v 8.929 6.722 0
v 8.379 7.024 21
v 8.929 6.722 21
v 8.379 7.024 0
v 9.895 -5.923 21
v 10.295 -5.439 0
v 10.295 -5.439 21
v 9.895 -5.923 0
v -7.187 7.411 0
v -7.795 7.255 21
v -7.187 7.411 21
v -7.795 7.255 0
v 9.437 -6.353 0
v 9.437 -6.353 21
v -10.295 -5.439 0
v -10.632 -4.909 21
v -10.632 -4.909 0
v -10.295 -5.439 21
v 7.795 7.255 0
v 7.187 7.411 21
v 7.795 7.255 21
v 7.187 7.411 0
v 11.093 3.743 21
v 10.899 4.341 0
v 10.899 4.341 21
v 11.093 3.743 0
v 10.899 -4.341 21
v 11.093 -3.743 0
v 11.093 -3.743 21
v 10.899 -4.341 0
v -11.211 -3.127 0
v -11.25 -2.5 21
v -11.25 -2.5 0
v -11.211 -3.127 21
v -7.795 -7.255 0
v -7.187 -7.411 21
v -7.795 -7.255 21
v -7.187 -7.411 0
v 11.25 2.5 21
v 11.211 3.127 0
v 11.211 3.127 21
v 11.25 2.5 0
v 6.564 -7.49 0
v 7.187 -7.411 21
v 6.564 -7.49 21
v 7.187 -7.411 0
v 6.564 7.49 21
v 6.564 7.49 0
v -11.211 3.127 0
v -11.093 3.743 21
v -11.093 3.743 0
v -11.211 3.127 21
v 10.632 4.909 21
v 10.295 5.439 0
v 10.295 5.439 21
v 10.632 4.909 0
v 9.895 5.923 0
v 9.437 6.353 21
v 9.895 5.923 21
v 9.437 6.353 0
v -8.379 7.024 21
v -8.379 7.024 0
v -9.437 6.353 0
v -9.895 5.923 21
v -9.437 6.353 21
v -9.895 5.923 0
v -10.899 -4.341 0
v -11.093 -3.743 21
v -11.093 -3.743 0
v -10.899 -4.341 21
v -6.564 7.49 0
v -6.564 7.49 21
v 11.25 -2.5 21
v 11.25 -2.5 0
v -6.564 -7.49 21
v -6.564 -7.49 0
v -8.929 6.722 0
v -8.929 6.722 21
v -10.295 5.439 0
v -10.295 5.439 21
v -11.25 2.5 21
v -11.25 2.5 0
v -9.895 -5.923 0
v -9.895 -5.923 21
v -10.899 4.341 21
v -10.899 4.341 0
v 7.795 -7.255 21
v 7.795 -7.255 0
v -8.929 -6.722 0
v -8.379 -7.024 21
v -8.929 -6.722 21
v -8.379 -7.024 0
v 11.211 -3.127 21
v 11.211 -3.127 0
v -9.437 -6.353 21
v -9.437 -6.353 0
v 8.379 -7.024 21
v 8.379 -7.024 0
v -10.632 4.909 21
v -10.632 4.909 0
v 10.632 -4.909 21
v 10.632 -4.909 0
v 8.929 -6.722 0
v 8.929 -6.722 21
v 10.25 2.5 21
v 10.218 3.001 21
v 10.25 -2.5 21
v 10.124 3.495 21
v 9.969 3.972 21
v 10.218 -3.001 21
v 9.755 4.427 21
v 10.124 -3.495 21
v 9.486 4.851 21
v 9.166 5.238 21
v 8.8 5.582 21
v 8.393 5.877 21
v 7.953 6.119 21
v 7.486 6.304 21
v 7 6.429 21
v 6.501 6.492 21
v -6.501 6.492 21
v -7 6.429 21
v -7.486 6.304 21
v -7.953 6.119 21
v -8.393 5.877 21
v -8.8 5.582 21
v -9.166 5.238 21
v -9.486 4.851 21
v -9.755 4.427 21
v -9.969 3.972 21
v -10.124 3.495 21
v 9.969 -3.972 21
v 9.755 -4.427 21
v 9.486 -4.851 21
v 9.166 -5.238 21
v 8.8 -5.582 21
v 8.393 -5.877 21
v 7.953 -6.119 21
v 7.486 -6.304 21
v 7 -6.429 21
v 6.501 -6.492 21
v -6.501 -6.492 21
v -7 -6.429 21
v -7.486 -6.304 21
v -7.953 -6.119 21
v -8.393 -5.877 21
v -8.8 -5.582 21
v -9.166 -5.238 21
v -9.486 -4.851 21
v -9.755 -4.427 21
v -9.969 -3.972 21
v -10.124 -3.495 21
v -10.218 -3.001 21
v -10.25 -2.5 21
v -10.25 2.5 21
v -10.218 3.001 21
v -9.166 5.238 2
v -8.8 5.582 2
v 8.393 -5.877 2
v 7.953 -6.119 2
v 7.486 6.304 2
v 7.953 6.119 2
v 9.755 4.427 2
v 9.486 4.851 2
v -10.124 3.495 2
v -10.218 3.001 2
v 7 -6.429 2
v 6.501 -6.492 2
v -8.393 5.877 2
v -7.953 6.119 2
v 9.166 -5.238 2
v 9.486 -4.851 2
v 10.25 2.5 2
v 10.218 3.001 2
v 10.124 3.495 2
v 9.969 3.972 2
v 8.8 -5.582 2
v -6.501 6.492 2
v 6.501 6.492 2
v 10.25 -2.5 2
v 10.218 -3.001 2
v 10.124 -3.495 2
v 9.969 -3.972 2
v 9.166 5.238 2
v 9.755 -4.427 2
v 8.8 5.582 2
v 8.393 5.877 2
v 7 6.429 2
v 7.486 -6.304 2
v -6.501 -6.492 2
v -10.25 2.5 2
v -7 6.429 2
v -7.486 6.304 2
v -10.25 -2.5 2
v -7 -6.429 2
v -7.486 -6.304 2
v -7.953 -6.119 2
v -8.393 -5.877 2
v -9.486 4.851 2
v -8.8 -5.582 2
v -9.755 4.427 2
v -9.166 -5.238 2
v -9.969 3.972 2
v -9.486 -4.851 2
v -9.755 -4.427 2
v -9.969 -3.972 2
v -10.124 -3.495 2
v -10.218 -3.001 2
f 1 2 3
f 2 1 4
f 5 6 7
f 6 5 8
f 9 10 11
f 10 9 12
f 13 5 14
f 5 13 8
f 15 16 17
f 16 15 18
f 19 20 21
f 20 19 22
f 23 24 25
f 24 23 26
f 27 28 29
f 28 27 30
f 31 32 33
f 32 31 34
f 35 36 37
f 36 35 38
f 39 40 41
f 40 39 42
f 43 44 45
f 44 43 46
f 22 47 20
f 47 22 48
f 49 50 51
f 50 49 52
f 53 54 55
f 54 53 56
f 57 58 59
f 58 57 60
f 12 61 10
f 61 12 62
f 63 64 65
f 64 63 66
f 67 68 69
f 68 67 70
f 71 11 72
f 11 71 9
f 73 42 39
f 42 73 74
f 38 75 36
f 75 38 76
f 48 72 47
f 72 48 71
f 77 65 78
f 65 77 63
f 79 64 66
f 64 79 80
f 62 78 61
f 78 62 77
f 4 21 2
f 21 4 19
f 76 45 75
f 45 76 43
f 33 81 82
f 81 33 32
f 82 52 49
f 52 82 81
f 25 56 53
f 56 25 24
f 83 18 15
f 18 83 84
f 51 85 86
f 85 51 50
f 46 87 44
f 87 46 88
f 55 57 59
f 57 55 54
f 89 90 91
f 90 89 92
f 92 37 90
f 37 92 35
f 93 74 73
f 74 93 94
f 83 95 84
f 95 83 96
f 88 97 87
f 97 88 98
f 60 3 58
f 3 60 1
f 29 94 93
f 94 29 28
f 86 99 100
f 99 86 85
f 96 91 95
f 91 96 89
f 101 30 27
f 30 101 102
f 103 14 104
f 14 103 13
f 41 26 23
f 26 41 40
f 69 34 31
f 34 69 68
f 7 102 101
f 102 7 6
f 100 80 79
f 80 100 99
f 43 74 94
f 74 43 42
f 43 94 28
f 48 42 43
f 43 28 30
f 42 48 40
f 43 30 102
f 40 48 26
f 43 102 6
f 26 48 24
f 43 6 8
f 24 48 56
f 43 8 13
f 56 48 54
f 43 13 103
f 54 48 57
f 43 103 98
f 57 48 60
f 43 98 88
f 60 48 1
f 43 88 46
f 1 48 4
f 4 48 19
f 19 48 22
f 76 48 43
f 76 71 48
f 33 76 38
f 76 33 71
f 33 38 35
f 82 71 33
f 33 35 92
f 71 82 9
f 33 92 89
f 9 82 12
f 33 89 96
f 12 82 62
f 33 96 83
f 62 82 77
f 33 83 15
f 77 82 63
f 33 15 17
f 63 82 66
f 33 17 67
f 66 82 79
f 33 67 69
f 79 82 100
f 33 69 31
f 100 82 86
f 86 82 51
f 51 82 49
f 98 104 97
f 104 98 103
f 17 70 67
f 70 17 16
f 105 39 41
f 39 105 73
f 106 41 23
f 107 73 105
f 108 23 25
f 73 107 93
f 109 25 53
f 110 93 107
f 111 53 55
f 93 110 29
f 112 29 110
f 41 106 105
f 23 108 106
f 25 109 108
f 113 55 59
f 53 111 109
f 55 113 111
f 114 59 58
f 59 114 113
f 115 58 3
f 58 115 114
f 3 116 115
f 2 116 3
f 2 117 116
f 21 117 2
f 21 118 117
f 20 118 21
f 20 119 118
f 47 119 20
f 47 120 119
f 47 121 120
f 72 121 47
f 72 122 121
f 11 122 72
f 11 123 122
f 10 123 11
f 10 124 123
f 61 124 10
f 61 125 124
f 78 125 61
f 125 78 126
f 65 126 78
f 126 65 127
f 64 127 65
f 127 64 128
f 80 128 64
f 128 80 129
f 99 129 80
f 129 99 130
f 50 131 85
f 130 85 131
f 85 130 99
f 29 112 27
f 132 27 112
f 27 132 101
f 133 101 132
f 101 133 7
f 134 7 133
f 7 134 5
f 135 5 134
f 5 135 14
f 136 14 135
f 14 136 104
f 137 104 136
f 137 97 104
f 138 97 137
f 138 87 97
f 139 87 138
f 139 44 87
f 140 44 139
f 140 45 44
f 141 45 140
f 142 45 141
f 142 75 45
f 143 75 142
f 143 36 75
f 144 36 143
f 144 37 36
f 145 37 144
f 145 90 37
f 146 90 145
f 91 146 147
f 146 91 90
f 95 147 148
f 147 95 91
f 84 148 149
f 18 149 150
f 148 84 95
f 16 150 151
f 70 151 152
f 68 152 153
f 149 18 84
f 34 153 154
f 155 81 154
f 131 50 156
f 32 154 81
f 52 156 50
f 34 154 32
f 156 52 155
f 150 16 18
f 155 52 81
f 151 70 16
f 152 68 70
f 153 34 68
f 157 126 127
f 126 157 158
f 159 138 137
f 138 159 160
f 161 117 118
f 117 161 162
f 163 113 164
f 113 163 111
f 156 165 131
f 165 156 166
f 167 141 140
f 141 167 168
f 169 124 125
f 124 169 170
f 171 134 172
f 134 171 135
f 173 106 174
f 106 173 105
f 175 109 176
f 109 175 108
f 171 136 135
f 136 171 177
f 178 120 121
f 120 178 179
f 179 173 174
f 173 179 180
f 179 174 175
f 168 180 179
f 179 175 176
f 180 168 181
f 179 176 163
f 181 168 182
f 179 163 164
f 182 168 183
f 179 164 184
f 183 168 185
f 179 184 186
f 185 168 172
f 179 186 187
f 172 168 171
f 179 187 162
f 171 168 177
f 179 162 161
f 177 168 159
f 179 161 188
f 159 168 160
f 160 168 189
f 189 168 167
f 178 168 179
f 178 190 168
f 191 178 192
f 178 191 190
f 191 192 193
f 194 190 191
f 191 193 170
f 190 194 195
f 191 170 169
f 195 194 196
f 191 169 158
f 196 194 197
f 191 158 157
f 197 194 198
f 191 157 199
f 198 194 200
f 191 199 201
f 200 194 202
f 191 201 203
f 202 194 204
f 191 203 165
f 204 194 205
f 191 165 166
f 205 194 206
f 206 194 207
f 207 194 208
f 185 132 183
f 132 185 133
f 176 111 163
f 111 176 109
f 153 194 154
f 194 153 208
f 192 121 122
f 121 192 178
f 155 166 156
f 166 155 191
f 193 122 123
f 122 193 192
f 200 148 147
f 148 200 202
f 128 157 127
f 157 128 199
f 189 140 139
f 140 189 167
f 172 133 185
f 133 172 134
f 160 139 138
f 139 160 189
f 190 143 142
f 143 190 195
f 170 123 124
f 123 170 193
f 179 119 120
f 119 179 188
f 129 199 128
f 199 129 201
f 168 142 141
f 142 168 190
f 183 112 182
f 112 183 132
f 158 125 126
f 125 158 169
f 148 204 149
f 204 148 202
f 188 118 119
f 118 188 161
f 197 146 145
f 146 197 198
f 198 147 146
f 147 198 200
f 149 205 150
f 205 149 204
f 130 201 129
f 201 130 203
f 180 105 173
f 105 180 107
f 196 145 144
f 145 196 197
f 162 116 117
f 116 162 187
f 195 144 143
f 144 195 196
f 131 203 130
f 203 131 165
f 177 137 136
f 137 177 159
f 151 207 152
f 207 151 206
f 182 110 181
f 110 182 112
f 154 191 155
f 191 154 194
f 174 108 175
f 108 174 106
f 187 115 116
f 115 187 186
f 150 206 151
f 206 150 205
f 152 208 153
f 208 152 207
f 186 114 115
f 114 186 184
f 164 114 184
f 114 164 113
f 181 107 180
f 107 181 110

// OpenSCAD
$fn = 50;


difference() {
	union() {
		hull() {
			translate(v = [-6.2500000000, 2.5000000000, 0]) {
				cylinder(h = 21, r = 5);
			}
			translate(v = [6.2500000000, 2.5000000000, 0]) {
				cylinder(h = 21, r = 5);
			}
			translate(v = [-6.2500000000, -2.5000000000, 0]) {
				cylinder(h = 21, r = 5);
			}
			translate(v = [6.2500000000, -2.5000000000, 0]) {
				cylinder(h = 21, r = 5);
			}
		}
	}
	union() {
		translate(v = [0, 0, 2]) {
			hull() {
				translate(v = [-6.2500000000, 2.5000000000, 0]) {
					cylinder(h = 19, r = 4);
				}
				translate(v = [6.2500000000, 2.5000000000, 0]) {
					cylinder(h = 19, r = 4);
				}
				translate(v = [-6.2500000000, -2.5000000000, 0]) {
					cylinder(h = 19, r = 4);
				}
				translate(v = [6.2500000000, -2.5000000000, 0]) {
					cylinder(h = 19, r = 4);
				}
			}
		}
	}
}
